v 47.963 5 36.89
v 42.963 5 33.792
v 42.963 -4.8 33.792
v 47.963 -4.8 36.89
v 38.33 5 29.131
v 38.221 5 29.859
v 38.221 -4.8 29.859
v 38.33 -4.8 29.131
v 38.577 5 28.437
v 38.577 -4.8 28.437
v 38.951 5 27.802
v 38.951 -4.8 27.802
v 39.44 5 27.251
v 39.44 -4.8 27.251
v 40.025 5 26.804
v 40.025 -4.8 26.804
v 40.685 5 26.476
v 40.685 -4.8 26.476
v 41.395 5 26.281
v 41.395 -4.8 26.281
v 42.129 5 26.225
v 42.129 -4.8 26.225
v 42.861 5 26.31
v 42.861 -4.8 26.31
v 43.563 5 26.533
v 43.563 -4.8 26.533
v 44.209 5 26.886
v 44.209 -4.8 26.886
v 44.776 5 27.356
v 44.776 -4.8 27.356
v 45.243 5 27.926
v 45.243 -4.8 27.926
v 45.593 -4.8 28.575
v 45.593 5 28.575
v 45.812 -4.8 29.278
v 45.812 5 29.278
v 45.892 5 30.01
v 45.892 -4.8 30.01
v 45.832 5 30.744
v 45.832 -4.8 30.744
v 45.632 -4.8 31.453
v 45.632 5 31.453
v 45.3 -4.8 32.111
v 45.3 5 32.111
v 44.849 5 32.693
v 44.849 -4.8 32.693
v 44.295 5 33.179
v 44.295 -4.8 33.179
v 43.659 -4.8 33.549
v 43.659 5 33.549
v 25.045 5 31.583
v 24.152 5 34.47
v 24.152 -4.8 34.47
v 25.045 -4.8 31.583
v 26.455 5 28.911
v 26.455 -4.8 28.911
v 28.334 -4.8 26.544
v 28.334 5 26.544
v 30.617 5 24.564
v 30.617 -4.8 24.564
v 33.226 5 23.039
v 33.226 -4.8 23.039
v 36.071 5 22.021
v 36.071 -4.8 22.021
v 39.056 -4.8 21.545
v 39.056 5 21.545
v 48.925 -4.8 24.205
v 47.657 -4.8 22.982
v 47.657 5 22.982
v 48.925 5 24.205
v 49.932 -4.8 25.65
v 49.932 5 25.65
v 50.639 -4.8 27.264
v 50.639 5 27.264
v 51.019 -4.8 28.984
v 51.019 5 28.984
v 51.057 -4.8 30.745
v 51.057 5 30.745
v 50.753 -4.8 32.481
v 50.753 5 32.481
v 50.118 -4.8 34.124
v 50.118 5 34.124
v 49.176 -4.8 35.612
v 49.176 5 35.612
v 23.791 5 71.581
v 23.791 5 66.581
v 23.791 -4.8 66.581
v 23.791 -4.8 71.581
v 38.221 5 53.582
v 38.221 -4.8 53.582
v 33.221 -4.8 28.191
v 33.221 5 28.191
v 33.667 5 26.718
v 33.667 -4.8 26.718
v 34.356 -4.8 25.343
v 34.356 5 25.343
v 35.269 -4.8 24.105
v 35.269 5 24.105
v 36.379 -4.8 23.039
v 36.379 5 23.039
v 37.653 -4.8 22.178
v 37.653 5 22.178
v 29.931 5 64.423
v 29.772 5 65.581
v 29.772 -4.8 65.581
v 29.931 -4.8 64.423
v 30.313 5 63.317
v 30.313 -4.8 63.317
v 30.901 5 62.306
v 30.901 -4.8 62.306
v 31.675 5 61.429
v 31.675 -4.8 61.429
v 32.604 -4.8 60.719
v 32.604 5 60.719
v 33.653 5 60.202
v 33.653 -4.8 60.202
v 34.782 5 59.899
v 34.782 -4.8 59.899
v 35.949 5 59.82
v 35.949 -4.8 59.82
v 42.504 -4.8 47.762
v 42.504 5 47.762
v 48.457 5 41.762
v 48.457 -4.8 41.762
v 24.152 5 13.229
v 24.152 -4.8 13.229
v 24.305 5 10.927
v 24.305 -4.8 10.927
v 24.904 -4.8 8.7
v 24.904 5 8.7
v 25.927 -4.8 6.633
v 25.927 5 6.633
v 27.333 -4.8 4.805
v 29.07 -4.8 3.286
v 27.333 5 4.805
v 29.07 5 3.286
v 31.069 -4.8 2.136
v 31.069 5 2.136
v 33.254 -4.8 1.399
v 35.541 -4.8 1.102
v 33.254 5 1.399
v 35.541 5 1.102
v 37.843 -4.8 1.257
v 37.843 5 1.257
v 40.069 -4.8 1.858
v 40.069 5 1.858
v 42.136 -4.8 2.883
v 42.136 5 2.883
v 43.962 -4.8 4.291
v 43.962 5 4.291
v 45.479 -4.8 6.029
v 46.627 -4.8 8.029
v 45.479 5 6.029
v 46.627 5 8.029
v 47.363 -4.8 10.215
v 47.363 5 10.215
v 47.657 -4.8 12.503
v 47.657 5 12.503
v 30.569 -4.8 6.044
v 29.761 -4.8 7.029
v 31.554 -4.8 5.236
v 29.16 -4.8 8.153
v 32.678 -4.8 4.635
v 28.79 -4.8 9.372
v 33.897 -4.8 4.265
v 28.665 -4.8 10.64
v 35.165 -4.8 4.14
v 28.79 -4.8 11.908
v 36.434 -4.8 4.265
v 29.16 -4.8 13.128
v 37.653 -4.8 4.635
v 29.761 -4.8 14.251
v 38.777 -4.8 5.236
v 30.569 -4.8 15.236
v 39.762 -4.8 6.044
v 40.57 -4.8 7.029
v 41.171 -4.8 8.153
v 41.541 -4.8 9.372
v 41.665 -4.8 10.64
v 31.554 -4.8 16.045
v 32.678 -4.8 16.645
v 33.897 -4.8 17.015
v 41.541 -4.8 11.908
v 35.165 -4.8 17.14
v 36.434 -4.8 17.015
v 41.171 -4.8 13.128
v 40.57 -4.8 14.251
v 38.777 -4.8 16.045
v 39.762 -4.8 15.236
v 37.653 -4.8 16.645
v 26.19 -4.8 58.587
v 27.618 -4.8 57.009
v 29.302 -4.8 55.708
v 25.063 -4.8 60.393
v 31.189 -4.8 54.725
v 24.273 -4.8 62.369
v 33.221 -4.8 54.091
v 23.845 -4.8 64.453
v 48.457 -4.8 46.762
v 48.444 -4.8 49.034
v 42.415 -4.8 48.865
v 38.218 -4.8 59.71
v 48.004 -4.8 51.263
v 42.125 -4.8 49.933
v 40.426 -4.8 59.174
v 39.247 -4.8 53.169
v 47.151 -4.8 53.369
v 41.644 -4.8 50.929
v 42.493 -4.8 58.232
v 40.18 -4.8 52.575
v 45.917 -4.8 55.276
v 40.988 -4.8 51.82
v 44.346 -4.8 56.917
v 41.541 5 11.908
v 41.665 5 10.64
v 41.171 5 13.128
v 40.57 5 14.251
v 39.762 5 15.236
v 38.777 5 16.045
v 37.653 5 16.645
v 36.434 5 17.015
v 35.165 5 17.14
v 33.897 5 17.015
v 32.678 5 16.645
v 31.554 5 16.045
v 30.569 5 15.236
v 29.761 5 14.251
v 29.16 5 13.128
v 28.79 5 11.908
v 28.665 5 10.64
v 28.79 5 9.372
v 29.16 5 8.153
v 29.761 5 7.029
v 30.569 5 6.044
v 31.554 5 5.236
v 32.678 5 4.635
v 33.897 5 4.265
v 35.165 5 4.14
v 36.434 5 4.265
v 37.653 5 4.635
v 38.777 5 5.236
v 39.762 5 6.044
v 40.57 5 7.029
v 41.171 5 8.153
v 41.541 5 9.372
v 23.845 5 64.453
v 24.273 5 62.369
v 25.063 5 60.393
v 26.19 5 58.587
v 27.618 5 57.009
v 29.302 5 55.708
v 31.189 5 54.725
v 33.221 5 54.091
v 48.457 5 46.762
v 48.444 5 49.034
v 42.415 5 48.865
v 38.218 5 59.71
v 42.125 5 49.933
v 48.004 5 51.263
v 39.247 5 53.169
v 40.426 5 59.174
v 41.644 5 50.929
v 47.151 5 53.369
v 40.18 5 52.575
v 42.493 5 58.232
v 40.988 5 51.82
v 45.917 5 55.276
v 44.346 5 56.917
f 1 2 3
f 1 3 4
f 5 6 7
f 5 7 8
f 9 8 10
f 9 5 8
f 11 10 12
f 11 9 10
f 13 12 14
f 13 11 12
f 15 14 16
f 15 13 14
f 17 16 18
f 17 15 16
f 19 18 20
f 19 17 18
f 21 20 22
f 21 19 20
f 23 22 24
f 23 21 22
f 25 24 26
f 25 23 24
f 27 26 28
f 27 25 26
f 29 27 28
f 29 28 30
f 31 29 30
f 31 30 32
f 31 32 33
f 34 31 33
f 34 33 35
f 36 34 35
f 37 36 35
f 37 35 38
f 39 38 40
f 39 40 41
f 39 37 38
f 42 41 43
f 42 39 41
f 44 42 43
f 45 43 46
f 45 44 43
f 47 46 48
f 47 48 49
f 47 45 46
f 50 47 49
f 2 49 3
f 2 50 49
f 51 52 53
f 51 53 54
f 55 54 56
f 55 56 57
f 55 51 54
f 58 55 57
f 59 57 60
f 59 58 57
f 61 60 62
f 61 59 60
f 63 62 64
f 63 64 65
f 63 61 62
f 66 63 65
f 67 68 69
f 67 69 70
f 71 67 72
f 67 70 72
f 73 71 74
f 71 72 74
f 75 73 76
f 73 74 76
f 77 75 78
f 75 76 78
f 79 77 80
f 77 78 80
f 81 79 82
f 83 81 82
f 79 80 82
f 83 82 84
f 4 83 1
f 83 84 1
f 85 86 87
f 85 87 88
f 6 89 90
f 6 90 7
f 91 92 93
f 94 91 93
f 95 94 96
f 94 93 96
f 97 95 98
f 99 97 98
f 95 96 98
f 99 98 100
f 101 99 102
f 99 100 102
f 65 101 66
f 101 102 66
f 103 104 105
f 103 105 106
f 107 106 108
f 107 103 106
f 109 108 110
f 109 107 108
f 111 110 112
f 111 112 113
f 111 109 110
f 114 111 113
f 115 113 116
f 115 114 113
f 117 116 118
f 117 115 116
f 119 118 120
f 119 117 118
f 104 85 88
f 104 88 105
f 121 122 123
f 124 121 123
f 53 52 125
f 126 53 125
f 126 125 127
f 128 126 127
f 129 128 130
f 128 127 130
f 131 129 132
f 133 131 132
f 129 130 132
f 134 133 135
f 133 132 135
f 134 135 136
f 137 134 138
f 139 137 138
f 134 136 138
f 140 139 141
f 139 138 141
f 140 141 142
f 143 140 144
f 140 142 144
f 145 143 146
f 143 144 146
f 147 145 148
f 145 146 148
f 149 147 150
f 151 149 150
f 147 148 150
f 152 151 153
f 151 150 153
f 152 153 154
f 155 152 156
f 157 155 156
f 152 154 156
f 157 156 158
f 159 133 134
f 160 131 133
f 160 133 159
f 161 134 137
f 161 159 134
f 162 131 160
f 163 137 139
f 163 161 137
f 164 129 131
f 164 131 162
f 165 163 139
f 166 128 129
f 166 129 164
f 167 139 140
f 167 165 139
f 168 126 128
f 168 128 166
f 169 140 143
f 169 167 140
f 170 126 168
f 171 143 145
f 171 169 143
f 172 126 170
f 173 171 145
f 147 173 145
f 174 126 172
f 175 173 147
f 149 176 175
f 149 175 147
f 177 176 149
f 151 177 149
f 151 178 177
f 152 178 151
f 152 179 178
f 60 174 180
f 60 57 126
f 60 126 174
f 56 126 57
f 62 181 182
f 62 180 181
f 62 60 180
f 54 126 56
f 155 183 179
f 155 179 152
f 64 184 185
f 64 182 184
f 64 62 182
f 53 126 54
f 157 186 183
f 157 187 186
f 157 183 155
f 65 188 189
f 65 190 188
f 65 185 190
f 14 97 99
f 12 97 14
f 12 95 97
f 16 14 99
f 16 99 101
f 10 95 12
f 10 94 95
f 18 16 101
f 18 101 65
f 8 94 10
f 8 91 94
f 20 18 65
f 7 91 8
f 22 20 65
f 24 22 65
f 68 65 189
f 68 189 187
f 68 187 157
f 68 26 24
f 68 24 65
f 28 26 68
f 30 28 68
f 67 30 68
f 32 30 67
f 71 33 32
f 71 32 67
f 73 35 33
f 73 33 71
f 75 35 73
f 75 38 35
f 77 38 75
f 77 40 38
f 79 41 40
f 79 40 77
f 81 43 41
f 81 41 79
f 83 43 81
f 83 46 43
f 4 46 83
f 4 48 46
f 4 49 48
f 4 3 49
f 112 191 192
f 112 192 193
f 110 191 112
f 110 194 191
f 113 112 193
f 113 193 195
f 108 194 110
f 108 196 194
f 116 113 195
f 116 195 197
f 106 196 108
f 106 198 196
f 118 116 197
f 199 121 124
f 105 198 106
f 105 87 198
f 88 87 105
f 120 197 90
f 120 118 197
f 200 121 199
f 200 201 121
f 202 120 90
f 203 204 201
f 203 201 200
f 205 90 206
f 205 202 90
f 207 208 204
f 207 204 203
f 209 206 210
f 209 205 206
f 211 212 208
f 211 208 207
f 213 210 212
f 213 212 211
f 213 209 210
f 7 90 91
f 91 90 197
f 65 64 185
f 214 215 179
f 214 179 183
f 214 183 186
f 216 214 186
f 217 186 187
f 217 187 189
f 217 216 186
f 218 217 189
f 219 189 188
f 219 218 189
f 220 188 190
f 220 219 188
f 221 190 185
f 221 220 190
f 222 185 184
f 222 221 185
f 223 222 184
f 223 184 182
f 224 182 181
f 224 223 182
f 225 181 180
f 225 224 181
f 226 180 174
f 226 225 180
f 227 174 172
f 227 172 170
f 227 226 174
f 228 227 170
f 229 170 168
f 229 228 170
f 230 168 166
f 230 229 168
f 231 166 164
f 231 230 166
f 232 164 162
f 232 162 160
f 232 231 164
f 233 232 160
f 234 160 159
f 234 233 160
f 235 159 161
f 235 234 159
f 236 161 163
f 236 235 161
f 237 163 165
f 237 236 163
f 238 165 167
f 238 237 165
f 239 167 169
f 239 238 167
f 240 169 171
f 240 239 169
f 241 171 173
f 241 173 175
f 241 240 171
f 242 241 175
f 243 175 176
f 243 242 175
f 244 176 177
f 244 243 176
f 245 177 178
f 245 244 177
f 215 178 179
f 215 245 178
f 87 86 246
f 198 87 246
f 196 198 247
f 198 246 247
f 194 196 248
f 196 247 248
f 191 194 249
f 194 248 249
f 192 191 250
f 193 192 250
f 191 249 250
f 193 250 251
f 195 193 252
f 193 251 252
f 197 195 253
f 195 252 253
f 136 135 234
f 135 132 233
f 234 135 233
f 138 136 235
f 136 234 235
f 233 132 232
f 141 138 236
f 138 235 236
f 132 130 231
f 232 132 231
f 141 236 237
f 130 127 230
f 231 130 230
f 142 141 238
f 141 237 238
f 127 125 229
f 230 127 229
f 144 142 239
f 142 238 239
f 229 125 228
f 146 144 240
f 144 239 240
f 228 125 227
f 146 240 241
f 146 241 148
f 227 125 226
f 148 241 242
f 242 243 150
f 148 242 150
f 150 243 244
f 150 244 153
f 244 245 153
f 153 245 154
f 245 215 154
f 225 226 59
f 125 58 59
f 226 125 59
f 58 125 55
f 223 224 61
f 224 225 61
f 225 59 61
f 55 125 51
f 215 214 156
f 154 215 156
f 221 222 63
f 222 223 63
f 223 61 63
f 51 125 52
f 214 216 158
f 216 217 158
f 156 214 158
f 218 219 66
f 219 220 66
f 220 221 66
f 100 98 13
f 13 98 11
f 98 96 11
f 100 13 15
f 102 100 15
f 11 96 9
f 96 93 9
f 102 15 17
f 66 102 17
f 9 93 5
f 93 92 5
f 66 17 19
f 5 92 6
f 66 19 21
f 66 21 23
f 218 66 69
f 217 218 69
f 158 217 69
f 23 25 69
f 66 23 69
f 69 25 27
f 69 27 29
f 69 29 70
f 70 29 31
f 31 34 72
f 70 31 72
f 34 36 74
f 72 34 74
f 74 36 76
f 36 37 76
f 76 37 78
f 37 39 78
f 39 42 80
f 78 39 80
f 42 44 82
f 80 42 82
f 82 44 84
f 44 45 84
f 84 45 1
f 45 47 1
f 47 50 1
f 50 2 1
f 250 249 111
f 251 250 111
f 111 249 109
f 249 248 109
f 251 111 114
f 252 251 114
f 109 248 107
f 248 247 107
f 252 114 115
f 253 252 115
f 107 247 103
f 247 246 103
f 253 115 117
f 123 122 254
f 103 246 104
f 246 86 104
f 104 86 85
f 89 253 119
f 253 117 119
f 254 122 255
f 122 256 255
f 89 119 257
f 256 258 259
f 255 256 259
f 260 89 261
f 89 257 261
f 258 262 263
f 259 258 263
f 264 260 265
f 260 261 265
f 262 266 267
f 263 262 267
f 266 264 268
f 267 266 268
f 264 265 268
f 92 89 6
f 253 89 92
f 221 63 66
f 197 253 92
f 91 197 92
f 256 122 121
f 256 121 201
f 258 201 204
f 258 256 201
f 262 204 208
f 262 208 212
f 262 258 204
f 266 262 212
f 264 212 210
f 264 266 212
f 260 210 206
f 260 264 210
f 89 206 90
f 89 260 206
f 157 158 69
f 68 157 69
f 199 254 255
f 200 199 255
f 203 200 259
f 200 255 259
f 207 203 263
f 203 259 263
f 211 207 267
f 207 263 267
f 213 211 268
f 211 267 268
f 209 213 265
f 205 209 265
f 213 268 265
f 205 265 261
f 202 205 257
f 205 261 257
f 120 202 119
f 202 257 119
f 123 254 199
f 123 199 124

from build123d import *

# Parameters (mm, degrees)
PAD005_DEPTH = 9.8
SKETCH007_R  = 6.5
PAD006_DEPTH = 9.8
PAD004_DEPTH = 9.8


with BuildPart() as pad005:
    # Sketch005 → Pad005 (new body)
    with BuildSketch(Plane.XZ.offset(-5)):
        with BuildLine():
            ThreePointArc((42.504006, 47.762261), (40.661796, 52.159127), (36.195109, 53.824922))
            ThreePointArc((23.79127, 66.581039), (27.163695, 57.451626), (36.195109, 53.824922))
            Line((23.79127, 66.581039), (23.79127, 71.581039))
            Line((23.79127, 71.581039), (29.771593, 65.581039))
            ThreePointArc((29.771593, 65.581039), (31.67487, 61.429233), (35.949268, 59.820052))
            ThreePointArc((48.456565, 46.762261), (45.170408, 56.133543), (35.949268, 59.820052))
            Line((48.456565, 46.762261), (48.456565, 41.762261))
            Line((42.504006, 47.762261), (48.456565, 41.762261))
        make_face()
    extrude(amount=PAD005_DEPTH)


with BuildPart() as pad006:
    # Sketch007 → Pad006 (new body)
    with BuildSketch(Plane.XZ.offset(-5)):
        with BuildLine():
            ThreePointArc((24.152058, 13.228672), (35.541387, 1.101686), (47.657351, 12.502741))
            Line((47.657351, 12.502741), (47.657351, 23.35503))
            ThreePointArc((24.152058, 34.470427), (33.144992, 23.076874), (47.657351, 23.35503))
            Line((24.152058, 34.470427), (24.152058, 13.228672))
        make_face()
        with Locations((35.165497, 10.640262)):
            Circle(SKETCH007_R, mode=Mode.SUBTRACT)
    extrude(amount=PAD006_DEPTH)


with BuildPart() as fusion:
    # Sketch006 → Pad004 (new body)
    with BuildSketch(Plane.XZ.offset(-5)):
        with BuildLine():
            Line((33.220749, 59.511791), (33.220749, 28.190693))
            ThreePointArc((33.220749, 28.190693), (46.642574, 22.285891), (47.96319, 36.889591))
            Line((42.96319, 33.791788), (47.96319, 36.889591))
            ThreePointArc((38.220749, 29.859131), (44.504272, 27.107563), (42.96319, 33.791788))
            Line((38.220749, 59.318303), (38.220749, 29.859131))
            Line((33.220749, 59.511791), (38.220749, 59.318303))
        make_face()
    extrude(amount=PAD004_DEPTH)

    # Fusion: union Pad005, Pad006
    add(pad005.part)
    add(pad006.part)


solid = fusion.part
